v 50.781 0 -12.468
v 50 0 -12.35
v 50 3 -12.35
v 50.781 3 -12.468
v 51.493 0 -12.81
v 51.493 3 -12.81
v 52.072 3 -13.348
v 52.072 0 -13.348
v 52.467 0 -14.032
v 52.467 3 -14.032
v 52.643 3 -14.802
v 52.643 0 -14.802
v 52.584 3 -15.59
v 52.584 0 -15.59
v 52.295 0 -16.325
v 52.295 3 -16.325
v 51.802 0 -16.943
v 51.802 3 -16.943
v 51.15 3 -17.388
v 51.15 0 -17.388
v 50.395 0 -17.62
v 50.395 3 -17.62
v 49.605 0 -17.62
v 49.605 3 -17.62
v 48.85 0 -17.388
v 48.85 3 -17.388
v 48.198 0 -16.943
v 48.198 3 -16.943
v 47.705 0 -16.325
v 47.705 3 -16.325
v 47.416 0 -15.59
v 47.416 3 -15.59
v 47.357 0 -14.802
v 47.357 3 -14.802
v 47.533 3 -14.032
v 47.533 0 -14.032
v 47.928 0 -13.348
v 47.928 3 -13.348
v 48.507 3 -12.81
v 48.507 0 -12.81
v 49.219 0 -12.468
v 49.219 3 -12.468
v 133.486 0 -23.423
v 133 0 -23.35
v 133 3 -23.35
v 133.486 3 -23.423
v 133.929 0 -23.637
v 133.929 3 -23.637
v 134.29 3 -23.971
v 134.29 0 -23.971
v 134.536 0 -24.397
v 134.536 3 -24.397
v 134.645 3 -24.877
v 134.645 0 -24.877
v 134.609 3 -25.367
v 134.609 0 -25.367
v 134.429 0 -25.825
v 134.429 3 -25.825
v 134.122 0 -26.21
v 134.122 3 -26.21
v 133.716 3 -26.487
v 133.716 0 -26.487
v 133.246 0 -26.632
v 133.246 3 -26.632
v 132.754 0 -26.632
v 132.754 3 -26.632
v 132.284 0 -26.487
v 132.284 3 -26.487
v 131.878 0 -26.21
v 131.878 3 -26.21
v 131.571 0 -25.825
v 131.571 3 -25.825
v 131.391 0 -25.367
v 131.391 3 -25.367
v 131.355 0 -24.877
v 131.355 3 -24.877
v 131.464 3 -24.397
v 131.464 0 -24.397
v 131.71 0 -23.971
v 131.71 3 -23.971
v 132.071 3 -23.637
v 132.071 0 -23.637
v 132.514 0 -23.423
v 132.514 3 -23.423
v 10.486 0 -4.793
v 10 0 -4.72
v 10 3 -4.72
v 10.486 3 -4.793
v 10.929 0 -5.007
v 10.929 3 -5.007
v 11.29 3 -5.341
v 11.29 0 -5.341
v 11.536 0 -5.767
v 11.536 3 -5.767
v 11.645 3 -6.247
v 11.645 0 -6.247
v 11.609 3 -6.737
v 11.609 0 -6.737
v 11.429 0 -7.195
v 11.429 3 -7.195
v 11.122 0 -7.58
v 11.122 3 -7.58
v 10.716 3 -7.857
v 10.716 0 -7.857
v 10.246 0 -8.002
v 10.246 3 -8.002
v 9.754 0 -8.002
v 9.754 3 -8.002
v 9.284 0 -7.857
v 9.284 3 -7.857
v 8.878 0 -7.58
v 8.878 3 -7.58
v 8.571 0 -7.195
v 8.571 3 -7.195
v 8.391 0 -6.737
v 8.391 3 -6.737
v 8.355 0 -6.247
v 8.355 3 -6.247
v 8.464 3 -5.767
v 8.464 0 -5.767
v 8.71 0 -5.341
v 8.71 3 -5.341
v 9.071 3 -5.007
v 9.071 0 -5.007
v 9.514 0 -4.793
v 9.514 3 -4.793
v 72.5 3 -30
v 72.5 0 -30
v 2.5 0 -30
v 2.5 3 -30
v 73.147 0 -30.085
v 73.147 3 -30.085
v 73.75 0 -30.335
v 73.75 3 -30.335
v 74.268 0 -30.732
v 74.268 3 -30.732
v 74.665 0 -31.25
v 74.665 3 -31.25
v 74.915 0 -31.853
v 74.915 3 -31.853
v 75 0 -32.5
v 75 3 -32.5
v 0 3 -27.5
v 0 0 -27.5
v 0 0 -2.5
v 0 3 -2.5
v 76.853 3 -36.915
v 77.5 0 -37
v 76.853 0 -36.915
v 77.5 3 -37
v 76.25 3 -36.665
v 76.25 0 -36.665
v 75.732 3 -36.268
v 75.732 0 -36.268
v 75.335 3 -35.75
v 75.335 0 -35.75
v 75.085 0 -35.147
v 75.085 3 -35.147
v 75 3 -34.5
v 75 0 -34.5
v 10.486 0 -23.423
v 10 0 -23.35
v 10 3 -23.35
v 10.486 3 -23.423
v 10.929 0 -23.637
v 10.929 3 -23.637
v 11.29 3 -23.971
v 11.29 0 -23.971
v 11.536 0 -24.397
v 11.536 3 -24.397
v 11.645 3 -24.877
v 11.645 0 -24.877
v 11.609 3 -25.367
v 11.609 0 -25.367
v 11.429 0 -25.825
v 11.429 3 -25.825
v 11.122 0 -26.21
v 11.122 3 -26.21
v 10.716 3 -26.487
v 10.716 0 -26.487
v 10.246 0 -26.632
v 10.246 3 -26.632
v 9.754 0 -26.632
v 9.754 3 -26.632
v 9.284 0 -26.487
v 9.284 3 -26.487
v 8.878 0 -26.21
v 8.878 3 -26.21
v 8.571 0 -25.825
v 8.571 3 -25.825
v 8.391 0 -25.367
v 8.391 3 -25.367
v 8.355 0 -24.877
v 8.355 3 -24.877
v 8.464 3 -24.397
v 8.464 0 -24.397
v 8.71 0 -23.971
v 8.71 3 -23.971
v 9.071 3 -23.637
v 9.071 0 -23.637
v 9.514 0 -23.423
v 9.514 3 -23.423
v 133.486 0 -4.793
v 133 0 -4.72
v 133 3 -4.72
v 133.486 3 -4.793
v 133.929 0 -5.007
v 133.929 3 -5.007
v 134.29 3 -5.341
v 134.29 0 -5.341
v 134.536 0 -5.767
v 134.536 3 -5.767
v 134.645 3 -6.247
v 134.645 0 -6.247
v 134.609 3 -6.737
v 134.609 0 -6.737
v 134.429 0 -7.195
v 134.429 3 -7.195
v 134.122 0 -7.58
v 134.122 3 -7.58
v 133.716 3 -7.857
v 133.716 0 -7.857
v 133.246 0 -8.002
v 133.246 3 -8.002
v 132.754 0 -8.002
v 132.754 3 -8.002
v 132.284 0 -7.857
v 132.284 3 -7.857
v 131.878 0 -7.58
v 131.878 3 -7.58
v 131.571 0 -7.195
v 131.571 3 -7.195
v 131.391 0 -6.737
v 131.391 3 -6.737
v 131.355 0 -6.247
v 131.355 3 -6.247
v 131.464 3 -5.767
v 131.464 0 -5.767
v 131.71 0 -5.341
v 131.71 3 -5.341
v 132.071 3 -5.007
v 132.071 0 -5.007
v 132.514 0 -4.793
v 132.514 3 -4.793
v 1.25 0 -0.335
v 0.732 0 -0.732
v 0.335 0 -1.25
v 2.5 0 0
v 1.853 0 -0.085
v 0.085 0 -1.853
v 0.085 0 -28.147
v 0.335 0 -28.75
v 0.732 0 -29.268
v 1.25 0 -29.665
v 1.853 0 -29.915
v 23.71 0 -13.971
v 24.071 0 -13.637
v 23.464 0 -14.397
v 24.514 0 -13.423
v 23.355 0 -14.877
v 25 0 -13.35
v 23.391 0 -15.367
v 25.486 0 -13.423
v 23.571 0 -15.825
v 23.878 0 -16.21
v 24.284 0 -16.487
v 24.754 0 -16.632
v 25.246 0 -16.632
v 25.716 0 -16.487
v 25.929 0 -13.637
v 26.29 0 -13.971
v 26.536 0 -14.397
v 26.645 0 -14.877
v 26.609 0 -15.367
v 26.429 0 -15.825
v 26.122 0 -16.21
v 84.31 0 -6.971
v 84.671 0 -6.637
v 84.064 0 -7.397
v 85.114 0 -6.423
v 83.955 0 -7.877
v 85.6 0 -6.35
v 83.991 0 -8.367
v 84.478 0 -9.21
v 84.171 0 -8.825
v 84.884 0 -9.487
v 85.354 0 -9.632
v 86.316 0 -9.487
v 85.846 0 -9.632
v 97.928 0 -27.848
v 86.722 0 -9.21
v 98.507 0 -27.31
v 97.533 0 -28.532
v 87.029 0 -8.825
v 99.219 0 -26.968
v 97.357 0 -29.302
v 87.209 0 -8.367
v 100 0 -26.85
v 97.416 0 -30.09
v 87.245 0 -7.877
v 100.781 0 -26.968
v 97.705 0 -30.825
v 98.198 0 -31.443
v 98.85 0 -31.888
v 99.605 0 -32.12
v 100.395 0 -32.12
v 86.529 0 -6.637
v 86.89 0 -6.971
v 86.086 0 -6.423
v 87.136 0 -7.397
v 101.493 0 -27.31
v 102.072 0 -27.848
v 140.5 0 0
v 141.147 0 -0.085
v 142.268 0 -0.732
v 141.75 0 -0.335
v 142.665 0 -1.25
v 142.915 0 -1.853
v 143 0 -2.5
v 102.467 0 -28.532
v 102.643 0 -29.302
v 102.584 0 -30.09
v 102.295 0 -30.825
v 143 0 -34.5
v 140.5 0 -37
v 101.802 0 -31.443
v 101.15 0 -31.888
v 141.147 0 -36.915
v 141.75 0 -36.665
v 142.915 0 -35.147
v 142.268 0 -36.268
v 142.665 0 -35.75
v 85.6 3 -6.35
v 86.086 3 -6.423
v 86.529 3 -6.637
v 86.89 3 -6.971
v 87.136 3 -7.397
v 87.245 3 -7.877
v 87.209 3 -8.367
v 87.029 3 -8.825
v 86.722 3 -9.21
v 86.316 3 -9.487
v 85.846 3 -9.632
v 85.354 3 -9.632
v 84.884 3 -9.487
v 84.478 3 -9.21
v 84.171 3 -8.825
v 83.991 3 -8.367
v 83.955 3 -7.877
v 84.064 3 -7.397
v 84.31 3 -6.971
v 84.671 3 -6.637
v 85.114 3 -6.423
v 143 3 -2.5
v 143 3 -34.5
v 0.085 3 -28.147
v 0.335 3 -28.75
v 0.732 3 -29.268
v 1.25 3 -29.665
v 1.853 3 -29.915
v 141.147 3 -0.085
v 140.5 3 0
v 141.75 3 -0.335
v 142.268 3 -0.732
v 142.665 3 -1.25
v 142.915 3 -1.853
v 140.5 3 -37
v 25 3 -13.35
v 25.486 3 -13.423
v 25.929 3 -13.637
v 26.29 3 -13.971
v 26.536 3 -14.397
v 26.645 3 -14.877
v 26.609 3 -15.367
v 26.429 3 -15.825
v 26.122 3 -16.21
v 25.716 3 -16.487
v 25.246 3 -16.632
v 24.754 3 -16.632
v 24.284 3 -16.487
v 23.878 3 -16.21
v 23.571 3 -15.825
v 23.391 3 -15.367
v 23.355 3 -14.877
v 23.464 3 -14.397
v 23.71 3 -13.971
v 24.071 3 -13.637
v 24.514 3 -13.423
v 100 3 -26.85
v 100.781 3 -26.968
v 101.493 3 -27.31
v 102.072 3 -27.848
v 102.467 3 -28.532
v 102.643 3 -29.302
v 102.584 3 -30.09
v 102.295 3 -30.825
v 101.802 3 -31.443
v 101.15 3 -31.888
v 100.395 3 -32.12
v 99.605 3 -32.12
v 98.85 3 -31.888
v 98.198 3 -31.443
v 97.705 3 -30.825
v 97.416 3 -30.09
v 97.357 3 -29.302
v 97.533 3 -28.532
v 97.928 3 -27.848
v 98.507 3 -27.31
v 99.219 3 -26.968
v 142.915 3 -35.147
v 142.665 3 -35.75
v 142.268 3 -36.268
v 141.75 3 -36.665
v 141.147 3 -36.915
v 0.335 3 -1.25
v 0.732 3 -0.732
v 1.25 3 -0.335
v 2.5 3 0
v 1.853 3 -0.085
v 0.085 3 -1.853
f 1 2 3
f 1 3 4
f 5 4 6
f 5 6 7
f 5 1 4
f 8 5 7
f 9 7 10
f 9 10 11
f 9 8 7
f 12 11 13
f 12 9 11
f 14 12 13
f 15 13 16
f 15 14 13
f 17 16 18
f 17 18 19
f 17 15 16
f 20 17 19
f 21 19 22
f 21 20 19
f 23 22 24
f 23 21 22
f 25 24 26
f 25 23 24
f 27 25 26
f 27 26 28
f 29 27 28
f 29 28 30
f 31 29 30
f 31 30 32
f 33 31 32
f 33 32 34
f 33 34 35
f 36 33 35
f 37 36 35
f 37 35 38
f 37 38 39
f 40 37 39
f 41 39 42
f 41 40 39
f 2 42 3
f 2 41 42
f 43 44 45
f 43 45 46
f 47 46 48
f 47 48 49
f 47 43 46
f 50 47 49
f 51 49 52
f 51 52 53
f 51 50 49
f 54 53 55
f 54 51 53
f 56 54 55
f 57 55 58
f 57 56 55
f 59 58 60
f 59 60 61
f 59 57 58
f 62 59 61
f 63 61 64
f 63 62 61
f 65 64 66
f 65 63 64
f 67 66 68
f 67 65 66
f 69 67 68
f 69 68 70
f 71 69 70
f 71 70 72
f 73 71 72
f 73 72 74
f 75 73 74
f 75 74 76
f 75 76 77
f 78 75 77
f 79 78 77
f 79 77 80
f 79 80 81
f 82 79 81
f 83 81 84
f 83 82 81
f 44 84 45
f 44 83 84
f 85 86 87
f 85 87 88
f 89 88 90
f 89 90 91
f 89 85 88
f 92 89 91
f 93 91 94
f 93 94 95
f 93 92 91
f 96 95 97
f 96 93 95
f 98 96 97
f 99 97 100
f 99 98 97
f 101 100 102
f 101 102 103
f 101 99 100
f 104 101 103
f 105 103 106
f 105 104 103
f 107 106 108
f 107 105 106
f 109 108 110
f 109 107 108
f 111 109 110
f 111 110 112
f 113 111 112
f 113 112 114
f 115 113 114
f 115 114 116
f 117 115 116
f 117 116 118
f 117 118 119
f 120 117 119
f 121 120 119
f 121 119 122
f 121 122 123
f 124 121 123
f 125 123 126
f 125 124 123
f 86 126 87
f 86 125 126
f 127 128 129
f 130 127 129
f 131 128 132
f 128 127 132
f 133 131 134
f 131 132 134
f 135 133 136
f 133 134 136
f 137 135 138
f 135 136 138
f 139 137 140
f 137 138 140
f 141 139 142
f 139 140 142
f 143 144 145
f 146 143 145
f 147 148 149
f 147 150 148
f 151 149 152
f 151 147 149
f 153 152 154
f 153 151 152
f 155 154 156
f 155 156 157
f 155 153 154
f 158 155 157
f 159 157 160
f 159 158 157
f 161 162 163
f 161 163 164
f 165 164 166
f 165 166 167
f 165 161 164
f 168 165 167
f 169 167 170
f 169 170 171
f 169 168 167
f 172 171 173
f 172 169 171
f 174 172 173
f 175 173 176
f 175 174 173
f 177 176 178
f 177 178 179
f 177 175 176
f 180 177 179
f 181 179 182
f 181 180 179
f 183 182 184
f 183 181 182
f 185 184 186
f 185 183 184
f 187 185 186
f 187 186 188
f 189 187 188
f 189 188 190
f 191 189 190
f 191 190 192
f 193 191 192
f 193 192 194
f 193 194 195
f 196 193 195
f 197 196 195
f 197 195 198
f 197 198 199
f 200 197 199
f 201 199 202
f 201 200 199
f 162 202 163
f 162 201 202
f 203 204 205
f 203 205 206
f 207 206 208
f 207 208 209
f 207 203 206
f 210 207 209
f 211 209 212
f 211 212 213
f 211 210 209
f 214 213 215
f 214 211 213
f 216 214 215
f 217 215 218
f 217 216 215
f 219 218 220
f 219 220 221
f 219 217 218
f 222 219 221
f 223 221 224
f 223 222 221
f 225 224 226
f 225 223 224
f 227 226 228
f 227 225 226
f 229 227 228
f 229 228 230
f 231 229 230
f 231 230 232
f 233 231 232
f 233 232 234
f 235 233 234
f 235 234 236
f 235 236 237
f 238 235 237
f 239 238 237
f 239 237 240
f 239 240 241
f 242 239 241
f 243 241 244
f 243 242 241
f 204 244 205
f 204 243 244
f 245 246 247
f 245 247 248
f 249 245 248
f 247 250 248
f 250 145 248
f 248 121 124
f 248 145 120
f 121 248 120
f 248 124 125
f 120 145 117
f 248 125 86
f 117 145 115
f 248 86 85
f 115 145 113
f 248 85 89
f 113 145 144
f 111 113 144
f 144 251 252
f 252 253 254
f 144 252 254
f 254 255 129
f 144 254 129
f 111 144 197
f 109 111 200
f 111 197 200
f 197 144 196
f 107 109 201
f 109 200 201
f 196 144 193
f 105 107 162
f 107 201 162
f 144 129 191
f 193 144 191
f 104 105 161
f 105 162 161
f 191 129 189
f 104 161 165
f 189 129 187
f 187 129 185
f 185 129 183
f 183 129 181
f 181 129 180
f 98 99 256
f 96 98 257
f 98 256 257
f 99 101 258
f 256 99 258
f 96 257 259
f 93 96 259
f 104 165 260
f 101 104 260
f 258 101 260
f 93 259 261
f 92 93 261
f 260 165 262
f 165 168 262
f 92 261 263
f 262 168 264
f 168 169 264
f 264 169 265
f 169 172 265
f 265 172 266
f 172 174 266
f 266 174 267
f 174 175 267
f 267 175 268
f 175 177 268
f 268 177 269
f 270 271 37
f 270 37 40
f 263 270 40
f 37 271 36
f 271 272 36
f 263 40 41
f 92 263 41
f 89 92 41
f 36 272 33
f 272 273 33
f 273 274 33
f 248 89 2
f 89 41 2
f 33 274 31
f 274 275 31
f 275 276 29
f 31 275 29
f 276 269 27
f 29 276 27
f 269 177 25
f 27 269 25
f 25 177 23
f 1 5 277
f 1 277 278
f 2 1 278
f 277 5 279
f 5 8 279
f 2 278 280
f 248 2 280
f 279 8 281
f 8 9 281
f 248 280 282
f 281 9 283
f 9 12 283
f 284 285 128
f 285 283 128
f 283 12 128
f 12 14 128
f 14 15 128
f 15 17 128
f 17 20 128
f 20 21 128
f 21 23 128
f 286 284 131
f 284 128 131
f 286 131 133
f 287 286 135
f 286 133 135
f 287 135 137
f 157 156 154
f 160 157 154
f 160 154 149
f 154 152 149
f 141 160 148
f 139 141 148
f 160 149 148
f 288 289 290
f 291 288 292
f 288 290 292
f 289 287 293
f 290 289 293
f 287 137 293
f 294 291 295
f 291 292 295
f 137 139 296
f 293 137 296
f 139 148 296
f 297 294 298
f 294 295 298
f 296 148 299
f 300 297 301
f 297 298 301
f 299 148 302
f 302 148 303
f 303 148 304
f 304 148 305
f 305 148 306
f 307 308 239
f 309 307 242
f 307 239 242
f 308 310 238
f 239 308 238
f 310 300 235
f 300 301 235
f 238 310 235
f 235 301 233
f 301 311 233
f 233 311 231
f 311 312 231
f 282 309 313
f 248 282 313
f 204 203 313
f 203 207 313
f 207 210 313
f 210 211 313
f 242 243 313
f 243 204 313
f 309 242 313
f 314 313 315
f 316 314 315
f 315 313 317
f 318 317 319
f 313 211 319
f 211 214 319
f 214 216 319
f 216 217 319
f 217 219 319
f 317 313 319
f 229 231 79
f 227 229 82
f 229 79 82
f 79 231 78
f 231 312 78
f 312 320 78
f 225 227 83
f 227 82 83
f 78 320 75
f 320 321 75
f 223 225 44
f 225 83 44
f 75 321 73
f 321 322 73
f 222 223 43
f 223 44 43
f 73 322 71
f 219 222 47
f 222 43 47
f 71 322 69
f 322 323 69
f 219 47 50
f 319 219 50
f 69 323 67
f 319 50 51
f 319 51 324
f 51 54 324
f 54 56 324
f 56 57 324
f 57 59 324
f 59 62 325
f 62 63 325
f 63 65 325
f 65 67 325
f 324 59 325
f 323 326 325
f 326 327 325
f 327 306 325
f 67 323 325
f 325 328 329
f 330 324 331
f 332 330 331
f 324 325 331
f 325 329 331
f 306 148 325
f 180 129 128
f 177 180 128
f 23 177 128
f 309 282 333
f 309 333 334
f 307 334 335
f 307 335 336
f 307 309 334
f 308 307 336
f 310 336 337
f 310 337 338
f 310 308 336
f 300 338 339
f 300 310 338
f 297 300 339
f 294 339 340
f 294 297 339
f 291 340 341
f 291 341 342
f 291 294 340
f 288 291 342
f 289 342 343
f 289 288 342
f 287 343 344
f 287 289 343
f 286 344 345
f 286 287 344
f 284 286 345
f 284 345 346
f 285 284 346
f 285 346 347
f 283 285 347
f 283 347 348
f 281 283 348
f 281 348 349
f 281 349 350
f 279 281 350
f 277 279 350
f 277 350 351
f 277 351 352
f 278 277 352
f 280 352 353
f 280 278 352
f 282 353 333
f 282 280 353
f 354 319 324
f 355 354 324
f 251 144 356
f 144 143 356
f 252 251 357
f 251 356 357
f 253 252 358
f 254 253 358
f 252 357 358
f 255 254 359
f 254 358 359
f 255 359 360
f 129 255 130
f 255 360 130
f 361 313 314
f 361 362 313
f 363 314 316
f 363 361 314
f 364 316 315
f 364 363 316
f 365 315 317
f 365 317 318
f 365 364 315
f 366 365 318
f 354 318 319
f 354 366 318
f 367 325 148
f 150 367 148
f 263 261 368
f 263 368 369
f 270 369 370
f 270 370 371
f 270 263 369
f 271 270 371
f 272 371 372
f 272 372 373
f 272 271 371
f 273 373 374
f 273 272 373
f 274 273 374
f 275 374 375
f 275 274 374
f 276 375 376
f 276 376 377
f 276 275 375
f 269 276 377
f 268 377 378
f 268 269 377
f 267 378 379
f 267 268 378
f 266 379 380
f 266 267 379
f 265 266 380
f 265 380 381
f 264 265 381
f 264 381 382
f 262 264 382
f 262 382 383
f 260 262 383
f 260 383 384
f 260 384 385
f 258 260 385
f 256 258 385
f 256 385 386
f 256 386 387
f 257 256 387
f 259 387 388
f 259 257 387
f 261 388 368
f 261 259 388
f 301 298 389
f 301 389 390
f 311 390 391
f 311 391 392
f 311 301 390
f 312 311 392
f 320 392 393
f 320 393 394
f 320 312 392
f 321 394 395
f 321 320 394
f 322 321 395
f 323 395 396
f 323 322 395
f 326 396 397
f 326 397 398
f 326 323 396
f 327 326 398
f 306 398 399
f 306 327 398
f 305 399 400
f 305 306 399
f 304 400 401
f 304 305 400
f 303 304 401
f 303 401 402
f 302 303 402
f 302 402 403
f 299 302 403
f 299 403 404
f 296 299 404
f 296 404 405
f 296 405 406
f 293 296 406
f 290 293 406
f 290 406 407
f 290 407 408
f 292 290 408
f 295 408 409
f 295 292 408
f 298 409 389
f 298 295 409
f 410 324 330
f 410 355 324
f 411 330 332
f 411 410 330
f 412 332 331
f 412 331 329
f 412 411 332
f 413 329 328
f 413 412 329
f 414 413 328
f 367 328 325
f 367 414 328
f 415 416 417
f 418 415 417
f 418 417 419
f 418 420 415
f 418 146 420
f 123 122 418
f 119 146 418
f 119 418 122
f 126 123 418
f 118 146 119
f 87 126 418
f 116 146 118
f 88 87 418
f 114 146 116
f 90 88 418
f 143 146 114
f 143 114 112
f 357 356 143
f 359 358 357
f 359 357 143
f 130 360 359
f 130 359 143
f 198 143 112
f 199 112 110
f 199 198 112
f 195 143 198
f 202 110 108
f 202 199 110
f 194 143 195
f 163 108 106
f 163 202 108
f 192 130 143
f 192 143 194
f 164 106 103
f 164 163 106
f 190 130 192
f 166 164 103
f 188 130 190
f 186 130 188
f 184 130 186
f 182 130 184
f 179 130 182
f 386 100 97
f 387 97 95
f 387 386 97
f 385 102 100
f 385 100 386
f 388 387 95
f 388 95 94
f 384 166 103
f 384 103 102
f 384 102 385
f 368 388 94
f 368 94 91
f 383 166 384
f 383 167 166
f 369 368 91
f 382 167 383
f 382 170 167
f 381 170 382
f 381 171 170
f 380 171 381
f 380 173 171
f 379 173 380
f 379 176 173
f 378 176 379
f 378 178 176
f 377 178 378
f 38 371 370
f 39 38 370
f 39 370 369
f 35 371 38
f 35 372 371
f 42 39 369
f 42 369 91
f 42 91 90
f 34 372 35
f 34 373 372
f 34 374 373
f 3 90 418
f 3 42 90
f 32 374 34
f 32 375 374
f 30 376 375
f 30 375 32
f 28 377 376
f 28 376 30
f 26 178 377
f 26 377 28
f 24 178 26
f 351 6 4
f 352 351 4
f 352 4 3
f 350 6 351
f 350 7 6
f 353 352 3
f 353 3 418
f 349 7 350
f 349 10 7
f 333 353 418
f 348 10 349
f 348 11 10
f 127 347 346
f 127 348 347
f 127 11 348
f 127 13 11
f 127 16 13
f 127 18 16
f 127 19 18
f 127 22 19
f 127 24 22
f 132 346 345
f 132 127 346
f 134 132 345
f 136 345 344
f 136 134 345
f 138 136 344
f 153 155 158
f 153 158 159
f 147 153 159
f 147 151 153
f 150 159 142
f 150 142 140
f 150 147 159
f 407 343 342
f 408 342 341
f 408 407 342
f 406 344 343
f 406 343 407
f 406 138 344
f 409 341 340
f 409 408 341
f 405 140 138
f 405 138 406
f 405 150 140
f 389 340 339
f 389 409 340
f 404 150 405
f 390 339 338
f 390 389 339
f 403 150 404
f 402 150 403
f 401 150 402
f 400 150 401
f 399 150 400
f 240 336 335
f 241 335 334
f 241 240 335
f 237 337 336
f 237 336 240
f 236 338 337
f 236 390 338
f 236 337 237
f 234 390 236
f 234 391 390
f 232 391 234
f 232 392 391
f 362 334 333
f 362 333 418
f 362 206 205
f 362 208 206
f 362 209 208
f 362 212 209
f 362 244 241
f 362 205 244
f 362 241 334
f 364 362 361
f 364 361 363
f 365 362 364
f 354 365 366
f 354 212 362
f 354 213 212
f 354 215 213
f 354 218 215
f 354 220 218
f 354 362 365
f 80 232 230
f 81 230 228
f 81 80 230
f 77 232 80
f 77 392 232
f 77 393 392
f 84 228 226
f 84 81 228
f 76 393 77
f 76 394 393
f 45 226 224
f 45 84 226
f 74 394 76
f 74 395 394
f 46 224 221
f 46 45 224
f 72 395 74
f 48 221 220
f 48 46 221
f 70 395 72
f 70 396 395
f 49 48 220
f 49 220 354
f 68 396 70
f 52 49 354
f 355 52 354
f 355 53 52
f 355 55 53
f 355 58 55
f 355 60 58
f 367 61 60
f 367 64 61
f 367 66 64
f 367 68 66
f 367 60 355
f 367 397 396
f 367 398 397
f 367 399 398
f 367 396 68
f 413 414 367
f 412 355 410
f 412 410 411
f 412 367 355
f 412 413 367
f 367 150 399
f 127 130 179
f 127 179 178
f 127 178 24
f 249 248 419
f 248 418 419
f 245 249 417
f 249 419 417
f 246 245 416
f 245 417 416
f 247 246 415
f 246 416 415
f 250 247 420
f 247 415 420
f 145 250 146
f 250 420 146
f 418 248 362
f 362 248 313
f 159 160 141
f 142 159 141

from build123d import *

# Parameters (mm, degrees)
SKETCH_1_R      = 1.65
SKETCH_1_R_2    = 2.65
EXTRUDE_1_DEPTH = 3
FILLET_1_R      = 2.5


with BuildPart() as part:
    # 草图1 → 凸台-拉伸1 (new body)
    with BuildSketch(Plane(origin=(0, 0, 0), x_dir=(1, 0, 0), z_dir=(0, 1, 0))):
        Polygon((0, 0), (143, 0), (143, 37), (75, 37), (75, 30), (0, 30), align=None)
        with Locations(Location((10, 25, 0), (0, 0, 270))):
            Circle(SKETCH_1_R, mode=Mode.SUBTRACT)
        with Locations(Location((10, 6.37, 0), (0, 0, 270))):
            Circle(SKETCH_1_R, mode=Mode.SUBTRACT)
        with Locations(Location((50, 15, 0), (0, 0, 270))):
            Circle(SKETCH_1_R_2, mode=Mode.SUBTRACT)
        with Locations(Location((25, 15, 0), (0, 0, 270))):
            Circle(SKETCH_1_R, mode=Mode.SUBTRACT)
        with Locations(Location((100, 29.5, 0), (0, 0, 270))):
            Circle(SKETCH_1_R_2, mode=Mode.SUBTRACT)
        with Locations(Location((85.6, 8, 0), (0, 0, 270))):
            Circle(SKETCH_1_R, mode=Mode.SUBTRACT)
        with Locations(Location((133, 25, 0), (0, 0, 270))):
            Circle(SKETCH_1_R, mode=Mode.SUBTRACT)
        with Locations(Location((133, 6.37, 0), (0, 0, 270))):
            Circle(SKETCH_1_R, mode=Mode.SUBTRACT)
    extrude(amount=EXTRUDE_1_DEPTH)

    # 圆角1
    fillet_1_edges = [part.edges().sort_by_distance(p)[0] for p in [
        (0, 1.5, -30),
        (75, 1.5, -30),
        (75, 1.5, -37),
        (143, 1.5, -37),
        (143, 1.5, 0),
        (0, 1.5, 0),
    ]]
    fillet(fillet_1_edges, radius=FILLET_1_R)


solid = part.part
